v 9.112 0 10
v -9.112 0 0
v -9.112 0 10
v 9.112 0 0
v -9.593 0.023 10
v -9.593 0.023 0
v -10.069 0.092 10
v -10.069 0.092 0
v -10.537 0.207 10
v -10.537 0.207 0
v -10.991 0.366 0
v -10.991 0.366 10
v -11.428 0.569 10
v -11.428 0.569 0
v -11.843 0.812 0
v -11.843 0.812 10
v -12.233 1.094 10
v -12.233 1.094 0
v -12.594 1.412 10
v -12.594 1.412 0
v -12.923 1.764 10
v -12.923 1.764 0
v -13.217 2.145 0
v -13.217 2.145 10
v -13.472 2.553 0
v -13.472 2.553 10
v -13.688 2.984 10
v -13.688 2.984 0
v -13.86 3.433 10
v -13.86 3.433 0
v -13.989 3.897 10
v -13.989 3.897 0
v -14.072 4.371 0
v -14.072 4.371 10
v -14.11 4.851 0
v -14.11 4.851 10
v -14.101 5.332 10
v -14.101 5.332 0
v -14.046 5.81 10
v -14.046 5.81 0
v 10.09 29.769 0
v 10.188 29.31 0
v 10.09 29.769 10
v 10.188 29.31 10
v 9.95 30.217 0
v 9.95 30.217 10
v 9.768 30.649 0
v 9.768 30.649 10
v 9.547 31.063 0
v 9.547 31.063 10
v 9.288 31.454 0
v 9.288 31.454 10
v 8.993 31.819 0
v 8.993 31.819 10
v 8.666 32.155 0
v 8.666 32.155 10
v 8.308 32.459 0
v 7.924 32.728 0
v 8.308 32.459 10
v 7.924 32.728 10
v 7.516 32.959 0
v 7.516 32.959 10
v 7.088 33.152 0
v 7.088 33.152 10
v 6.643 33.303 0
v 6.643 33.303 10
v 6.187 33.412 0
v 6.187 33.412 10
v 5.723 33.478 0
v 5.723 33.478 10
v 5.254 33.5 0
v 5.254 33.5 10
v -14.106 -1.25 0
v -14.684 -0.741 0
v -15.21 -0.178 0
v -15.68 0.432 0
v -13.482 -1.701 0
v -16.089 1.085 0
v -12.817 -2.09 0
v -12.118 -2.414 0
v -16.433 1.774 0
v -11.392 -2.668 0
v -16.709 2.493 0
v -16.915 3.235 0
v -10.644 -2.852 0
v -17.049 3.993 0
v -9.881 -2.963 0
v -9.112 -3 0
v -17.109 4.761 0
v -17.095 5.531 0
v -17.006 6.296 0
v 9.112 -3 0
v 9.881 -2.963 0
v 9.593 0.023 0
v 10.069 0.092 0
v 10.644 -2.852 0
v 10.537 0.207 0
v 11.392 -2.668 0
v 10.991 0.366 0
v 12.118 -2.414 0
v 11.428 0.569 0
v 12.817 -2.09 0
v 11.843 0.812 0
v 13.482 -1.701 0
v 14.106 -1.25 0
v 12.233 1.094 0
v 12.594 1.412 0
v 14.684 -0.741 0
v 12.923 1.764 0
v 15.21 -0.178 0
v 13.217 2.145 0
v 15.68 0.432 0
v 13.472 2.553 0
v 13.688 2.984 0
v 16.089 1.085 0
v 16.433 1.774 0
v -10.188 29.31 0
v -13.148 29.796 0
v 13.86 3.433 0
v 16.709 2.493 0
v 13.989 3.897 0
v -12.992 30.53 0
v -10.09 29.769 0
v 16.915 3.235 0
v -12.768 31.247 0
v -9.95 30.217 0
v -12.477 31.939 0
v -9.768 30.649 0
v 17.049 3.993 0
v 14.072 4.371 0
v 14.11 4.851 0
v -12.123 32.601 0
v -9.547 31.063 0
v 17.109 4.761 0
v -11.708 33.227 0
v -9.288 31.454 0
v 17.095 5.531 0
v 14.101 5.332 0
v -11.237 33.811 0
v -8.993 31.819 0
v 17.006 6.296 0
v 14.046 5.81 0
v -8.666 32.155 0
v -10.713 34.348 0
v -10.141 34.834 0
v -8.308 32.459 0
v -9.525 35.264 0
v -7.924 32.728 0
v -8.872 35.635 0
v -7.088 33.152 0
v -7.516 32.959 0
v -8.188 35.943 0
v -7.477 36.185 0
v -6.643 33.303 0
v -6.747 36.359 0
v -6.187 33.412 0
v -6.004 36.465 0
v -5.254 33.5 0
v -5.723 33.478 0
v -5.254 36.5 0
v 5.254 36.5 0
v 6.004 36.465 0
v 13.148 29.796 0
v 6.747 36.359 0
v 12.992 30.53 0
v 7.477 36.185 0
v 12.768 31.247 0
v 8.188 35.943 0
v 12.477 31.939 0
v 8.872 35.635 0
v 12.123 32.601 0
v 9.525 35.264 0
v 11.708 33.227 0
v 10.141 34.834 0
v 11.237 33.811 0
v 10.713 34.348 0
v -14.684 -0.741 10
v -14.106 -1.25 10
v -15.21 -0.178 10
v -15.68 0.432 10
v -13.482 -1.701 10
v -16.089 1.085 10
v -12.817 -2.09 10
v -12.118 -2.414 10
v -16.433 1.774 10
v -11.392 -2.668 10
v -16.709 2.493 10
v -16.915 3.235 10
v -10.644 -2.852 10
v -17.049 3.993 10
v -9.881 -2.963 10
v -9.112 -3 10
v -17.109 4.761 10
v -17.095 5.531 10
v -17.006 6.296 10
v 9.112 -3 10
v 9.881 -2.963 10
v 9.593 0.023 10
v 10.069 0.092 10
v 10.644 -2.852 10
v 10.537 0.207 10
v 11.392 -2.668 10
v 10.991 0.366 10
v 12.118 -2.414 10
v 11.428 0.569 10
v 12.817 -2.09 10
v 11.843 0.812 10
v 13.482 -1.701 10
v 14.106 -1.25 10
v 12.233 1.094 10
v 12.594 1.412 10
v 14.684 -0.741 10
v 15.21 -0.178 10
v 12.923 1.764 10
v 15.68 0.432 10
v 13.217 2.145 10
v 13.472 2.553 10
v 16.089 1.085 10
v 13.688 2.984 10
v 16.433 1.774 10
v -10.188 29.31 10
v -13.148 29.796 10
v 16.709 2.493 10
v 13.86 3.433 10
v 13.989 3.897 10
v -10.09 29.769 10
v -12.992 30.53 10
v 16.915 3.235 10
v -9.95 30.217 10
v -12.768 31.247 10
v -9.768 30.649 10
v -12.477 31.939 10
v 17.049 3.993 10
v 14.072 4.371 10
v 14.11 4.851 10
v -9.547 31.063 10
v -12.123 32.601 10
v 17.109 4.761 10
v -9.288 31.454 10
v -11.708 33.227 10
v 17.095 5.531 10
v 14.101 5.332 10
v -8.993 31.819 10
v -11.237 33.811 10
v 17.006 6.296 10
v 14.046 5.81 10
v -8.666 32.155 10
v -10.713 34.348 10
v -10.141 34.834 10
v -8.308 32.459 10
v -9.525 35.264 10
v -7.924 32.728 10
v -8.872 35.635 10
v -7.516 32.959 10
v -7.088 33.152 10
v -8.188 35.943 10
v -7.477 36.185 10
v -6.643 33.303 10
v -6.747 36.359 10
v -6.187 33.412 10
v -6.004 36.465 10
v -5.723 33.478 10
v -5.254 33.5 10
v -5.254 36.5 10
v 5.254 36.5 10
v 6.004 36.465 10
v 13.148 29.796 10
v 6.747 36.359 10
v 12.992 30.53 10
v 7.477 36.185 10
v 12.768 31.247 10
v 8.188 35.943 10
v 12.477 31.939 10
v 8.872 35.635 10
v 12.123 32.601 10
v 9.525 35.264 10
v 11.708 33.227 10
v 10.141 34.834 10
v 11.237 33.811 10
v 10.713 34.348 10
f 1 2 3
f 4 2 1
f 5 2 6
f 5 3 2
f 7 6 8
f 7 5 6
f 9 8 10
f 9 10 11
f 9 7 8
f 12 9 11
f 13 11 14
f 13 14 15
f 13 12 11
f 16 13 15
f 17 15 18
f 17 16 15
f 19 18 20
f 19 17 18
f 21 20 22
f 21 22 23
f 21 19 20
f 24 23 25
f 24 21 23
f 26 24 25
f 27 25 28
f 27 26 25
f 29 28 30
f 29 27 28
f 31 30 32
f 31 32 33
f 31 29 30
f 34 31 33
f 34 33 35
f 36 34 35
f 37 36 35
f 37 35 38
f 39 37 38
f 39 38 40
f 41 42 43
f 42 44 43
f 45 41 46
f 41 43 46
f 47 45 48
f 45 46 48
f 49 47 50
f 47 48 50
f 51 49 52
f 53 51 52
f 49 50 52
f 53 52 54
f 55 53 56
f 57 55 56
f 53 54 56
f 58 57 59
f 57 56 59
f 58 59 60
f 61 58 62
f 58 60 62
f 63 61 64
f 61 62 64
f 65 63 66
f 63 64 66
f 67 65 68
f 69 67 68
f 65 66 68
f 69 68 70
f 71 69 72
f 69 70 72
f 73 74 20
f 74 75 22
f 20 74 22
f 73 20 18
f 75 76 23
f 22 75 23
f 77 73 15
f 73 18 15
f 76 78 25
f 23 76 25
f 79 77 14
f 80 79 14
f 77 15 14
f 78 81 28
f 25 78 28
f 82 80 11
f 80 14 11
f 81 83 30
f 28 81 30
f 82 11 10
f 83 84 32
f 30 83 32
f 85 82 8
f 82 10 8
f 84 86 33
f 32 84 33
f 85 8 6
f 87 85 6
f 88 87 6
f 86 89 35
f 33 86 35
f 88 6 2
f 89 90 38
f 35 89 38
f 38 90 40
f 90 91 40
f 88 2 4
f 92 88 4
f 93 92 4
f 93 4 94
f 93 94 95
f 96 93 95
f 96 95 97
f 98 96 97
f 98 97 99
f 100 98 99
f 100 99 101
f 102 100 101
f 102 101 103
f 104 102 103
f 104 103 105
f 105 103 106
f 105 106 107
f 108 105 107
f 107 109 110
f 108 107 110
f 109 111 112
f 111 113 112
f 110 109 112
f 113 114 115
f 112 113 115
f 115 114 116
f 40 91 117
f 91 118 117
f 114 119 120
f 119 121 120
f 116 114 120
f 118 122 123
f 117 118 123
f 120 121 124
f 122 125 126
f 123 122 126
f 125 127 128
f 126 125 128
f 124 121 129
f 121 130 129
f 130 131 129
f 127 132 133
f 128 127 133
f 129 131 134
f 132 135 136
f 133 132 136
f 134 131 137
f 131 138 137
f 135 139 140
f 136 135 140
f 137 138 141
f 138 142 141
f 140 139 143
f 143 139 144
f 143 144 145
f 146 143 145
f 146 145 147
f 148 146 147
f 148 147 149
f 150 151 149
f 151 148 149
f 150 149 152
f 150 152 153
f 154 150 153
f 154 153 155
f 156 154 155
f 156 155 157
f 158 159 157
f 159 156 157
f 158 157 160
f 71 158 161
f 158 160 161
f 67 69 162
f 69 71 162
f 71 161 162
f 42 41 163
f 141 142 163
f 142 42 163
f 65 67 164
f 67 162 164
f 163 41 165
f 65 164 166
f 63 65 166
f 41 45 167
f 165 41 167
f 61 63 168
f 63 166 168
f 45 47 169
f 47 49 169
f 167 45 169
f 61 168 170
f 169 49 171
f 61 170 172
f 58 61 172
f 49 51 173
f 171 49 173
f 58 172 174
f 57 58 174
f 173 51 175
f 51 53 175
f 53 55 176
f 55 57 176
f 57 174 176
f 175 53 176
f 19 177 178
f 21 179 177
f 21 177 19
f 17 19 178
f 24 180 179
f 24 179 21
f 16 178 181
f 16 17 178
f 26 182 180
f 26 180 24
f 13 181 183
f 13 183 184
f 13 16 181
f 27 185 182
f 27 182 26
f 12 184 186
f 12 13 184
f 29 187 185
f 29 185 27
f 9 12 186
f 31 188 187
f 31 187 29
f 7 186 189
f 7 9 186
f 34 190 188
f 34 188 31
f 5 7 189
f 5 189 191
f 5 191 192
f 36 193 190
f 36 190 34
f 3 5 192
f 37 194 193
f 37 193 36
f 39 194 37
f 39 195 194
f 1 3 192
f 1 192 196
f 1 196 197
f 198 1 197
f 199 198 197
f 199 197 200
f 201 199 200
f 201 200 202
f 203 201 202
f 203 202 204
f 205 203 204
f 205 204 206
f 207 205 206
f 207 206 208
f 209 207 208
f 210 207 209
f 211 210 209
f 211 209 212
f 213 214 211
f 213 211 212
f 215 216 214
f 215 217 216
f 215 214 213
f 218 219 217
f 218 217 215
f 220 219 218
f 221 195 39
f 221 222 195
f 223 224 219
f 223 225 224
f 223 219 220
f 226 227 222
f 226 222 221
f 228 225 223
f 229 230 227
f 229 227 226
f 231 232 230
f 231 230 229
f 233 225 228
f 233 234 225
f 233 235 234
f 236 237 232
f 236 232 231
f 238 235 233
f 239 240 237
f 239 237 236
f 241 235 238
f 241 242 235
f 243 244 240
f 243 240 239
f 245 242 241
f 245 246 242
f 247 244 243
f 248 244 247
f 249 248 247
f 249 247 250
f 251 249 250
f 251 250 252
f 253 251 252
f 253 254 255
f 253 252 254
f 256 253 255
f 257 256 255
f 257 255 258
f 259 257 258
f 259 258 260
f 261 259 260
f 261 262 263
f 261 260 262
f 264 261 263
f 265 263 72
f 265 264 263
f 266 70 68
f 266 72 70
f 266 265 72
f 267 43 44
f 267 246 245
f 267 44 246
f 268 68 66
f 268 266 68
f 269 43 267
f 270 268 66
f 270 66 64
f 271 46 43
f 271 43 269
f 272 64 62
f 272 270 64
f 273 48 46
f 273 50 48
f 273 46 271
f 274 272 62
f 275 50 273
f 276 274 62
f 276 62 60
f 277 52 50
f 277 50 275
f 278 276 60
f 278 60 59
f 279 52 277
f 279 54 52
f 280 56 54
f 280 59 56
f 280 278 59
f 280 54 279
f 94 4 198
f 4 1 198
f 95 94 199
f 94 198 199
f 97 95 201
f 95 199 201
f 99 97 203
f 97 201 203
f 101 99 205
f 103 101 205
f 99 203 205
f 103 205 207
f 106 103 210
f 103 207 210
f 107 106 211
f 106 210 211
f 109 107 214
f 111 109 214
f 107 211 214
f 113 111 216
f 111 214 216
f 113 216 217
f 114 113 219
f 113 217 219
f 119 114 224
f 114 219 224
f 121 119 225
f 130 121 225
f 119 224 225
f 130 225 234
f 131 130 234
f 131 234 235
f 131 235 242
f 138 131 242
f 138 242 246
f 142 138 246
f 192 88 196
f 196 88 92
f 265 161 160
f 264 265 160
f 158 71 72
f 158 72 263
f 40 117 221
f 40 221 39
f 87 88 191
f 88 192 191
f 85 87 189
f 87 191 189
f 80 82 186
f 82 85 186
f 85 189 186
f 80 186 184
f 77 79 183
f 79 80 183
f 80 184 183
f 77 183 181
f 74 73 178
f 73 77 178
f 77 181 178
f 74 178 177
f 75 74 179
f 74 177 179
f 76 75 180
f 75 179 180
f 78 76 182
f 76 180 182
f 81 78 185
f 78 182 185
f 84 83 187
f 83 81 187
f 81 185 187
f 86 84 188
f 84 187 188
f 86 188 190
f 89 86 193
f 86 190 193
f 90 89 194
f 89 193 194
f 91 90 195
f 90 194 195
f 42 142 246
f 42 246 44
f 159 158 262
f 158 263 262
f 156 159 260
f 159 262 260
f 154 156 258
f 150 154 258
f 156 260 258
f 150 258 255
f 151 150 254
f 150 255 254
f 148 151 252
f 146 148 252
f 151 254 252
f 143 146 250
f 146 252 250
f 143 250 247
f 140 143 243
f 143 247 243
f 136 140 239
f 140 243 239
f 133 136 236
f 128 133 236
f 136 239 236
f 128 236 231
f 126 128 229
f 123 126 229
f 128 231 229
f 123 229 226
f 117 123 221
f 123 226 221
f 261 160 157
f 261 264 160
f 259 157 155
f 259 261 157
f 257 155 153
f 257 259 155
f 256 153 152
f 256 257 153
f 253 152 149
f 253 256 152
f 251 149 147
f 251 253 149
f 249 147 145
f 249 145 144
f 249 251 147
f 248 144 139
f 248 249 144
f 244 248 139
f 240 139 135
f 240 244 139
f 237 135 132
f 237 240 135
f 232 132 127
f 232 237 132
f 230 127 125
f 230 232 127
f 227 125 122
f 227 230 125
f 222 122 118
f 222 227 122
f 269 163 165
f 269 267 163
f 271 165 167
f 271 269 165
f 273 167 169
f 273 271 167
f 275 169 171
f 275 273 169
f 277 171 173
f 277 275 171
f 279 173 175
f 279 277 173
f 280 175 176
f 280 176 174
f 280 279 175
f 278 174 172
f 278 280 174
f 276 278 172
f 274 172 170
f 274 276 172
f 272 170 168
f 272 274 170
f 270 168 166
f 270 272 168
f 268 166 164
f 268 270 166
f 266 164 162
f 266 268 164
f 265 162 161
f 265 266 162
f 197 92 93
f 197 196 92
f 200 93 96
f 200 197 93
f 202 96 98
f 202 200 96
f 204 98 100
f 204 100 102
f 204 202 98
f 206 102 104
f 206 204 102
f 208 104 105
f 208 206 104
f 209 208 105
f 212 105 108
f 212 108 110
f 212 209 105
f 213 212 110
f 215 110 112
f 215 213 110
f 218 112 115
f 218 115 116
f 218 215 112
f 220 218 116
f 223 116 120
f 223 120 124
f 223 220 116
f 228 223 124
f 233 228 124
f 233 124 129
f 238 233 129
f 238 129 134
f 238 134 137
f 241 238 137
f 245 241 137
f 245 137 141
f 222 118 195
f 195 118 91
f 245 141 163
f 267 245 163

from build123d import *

# Parameters (mm, degrees)
BOSS_EXTRU_2_DEPTH = 10
CONG_2_R           = 5
COQUE3_T           = 3


with BuildPart() as part:
    # Esquisse1 → Boss.-Extru.2 (new body)
    with BuildSketch(Plane.XY):
        Polygon((-15, 0), (15, 0), (9.5, 33.5), (-9.5, 33.5), align=None)
    extrude(amount=BOSS_EXTRU_2_DEPTH)

    # Congé2
    cong_2_edges = [part.edges().sort_by_distance(p)[0] for p in [
        (15, 0, 5),
        (-15, 0, 5),
        (-9.5, 33.5, 5),
        (9.5, 33.5, 5),
    ]]
    fillet(cong_2_edges, radius=CONG_2_R)

    # Coque3
    coque3_openings = [part.faces().sort_by_distance(p)[0] for p in [
        (0, 15.617025891, 0),
        (0, 15.617025891, 10),
    ]]
    offset(amount=COQUE3_T, openings=coque3_openings, kind=Kind.INTERSECTION)


solid = part.part
